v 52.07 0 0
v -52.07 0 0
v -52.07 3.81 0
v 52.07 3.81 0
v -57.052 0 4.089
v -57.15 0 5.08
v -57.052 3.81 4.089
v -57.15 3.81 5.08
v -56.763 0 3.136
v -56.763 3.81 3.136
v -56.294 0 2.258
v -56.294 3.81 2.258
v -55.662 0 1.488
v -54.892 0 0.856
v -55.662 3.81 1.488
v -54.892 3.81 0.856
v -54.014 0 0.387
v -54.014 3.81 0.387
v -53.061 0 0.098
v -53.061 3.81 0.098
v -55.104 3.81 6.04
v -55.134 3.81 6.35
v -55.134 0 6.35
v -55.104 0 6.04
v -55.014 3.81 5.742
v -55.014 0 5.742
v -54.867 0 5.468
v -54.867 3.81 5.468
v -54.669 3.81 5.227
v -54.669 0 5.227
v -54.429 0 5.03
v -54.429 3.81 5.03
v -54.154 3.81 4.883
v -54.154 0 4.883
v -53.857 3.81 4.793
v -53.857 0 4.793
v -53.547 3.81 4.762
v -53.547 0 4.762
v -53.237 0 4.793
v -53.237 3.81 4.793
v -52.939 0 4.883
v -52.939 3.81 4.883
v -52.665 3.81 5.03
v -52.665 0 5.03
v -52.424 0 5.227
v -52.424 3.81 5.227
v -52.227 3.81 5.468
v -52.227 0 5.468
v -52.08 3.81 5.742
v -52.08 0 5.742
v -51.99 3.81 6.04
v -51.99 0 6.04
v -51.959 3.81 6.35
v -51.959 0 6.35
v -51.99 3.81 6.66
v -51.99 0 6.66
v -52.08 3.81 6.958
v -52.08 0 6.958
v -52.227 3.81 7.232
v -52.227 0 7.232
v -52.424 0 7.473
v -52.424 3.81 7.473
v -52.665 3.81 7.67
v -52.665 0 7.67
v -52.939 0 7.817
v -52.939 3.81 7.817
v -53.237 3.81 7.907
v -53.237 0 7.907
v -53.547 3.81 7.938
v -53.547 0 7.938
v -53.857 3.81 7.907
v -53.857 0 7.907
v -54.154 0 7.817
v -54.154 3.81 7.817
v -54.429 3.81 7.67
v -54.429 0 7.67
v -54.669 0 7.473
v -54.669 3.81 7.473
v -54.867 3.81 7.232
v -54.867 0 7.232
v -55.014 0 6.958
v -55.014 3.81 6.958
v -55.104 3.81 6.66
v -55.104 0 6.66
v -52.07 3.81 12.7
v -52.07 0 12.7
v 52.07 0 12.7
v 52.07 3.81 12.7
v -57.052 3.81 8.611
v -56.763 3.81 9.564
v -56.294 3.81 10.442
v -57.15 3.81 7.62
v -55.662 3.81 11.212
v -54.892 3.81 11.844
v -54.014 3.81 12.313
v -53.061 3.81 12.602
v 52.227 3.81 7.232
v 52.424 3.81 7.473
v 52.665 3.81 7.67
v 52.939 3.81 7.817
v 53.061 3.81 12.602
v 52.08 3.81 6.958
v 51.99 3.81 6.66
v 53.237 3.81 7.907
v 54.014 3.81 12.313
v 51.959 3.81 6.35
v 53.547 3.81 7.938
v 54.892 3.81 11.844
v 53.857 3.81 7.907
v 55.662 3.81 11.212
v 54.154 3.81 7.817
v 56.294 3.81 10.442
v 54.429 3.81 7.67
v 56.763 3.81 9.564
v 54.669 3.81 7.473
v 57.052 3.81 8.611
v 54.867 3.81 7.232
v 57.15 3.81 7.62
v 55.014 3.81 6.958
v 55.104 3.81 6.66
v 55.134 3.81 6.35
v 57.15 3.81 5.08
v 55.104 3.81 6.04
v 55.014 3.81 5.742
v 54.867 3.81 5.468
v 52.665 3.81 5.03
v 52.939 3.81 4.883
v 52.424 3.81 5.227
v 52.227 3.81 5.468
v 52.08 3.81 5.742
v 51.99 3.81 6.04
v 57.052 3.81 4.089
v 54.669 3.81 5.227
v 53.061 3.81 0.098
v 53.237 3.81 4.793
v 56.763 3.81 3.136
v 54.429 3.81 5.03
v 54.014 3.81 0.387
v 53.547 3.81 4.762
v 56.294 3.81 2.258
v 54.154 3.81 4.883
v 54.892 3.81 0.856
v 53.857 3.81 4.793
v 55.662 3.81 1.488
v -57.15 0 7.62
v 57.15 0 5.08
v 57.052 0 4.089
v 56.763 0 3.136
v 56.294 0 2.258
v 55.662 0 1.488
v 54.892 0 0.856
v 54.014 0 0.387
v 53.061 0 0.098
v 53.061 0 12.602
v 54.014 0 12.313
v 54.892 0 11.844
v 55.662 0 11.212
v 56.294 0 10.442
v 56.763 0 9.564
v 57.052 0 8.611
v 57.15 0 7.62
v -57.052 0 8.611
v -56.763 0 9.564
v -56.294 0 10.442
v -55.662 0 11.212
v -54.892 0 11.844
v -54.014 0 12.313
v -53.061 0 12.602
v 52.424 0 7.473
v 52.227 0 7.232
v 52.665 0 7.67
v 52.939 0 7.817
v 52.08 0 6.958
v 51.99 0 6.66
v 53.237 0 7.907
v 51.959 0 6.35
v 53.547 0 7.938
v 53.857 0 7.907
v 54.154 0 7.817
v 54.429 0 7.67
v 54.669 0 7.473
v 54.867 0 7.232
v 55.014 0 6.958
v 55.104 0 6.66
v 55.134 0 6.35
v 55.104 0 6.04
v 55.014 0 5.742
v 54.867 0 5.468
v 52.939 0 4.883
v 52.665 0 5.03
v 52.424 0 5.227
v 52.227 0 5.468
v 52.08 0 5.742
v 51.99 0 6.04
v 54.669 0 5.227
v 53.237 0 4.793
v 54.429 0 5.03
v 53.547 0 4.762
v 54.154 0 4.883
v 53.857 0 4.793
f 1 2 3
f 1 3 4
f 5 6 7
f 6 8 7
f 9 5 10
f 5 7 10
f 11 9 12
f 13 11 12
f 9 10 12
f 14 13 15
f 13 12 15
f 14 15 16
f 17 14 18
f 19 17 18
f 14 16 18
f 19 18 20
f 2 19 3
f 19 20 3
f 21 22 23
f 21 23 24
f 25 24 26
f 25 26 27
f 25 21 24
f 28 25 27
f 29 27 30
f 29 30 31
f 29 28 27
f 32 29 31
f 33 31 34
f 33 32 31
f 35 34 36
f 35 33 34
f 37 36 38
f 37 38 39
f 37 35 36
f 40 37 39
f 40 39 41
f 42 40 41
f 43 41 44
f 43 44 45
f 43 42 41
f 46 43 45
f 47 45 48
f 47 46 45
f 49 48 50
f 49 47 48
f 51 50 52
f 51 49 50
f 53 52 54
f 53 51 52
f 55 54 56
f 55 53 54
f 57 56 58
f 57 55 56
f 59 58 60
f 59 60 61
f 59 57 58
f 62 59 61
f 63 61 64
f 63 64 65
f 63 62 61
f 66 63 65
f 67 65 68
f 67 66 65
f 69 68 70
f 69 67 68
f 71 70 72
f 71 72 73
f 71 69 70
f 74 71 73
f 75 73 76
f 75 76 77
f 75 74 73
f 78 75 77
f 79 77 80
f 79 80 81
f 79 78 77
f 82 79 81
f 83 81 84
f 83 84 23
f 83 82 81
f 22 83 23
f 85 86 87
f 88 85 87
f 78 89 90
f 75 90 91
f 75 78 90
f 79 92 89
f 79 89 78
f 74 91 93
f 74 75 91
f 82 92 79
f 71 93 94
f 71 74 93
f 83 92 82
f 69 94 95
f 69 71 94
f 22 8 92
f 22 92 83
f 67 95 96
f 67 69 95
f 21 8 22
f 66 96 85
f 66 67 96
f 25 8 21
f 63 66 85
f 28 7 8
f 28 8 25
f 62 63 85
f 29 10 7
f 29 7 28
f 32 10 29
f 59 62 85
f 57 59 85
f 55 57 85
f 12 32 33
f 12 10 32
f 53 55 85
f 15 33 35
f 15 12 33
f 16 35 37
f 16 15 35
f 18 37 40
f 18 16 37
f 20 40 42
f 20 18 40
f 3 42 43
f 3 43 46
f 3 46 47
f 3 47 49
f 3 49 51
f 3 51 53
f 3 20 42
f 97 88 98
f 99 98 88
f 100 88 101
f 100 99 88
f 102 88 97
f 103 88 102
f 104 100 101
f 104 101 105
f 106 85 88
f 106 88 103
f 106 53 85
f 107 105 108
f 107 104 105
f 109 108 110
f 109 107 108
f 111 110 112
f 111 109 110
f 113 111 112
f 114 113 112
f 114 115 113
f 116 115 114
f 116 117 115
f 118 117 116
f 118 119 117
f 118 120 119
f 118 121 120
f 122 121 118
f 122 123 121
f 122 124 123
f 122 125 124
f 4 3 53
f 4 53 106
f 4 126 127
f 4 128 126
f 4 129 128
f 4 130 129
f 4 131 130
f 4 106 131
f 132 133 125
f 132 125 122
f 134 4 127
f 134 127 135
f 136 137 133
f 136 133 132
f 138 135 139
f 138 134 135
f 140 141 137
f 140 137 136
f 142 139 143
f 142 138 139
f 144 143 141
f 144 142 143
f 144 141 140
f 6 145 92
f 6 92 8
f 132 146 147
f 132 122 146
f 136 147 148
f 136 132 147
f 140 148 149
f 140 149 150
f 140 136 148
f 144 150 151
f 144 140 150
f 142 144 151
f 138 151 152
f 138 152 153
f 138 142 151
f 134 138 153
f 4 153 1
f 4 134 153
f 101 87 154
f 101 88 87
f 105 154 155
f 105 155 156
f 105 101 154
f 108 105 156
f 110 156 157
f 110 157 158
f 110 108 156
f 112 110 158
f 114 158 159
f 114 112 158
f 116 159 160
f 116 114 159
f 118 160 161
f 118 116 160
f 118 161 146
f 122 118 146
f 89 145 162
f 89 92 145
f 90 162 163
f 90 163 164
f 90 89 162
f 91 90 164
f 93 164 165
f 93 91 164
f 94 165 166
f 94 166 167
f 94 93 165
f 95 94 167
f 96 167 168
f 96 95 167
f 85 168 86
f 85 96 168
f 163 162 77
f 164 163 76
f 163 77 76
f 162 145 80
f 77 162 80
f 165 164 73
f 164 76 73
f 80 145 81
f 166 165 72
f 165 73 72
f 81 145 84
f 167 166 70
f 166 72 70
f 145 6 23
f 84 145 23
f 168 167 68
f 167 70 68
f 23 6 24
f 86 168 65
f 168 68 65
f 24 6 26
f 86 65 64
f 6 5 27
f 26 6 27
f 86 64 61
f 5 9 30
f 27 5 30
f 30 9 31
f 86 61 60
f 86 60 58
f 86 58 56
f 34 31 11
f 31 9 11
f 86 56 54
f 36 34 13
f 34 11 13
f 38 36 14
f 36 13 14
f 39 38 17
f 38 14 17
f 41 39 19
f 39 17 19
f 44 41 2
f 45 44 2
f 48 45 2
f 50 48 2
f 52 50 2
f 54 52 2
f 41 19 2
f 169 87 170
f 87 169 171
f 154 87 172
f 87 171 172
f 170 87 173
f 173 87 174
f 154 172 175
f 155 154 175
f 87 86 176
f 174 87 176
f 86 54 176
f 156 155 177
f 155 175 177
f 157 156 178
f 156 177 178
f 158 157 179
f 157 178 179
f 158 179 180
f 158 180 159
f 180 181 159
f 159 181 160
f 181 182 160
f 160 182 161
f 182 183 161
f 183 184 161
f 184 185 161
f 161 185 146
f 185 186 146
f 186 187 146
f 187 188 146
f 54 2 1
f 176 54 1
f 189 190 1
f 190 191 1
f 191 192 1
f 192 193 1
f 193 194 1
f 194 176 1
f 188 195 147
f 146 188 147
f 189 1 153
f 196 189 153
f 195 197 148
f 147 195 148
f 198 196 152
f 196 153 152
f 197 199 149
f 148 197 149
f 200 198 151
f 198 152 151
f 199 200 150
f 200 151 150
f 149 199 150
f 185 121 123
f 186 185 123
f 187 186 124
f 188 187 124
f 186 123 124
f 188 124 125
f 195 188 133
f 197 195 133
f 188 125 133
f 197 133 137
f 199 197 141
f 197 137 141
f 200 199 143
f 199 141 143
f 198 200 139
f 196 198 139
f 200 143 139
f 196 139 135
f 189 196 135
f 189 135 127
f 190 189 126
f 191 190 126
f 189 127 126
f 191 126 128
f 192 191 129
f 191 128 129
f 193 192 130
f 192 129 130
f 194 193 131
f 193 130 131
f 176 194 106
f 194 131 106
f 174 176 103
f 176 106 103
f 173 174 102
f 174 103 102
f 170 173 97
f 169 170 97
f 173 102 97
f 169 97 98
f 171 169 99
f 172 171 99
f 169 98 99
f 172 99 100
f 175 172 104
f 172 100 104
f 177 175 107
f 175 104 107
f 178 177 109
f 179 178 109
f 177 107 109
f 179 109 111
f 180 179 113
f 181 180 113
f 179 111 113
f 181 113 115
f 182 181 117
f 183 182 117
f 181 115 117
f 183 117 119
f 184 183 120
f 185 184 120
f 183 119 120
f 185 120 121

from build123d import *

# Parameters (mm, degrees)
SKETCH1_W           = 114.3
SKETCH1_H           = 12.7
EXTRUDE_THIN1_DEPTH = 3.81
FILLET1_R           = 5.08
SKETCH3_R           = 1.5875
CUT_EXTRUDE1_DEPTH  = 3.81


with BuildPart() as part:
    # Sketch1 → Extrude-Thin1 (new body)
    with BuildSketch(Plane(origin=(0, 0, 0), x_dir=(1, 0, 0), z_dir=(0, 1, 0))):
        with Locations((0, -6.35)):
            Rectangle(SKETCH1_W, SKETCH1_H)
    extrude(amount=EXTRUDE_THIN1_DEPTH)

    # Fillet1
    fillet1_edges = [part.edges().sort_by_distance(p)[0] for p in [
        (-57.15, 1.905, 12.7),
        (-57.15, 1.905, 0),
        (57.15, 1.905, 0),
        (57.15, 1.905, 12.7),
    ]]
    fillet(fillet1_edges, radius=FILLET1_R)

    # Sketch3 → Cut-Extrude1 (cut)
    with BuildSketch(Plane(origin=(0, 3.81, 0), x_dir=(1, 0, 0), z_dir=(0, 1, 0))):
        with Locations((53.54685275, -6.35)):
            Circle(SKETCH3_R)
    cut_extrude1 = extrude(amount=-CUT_EXTRUDE1_DEPTH, mode=Mode.SUBTRACT)

    # Mirror1: Cut-Extrude1 across plane
    add(cut_extrude1.mirror(Plane(origin=(0, 0, 0), x_dir=(0, 0, 1), z_dir=(1, 0, 0))), mode=Mode.SUBTRACT)


solid = part.part
